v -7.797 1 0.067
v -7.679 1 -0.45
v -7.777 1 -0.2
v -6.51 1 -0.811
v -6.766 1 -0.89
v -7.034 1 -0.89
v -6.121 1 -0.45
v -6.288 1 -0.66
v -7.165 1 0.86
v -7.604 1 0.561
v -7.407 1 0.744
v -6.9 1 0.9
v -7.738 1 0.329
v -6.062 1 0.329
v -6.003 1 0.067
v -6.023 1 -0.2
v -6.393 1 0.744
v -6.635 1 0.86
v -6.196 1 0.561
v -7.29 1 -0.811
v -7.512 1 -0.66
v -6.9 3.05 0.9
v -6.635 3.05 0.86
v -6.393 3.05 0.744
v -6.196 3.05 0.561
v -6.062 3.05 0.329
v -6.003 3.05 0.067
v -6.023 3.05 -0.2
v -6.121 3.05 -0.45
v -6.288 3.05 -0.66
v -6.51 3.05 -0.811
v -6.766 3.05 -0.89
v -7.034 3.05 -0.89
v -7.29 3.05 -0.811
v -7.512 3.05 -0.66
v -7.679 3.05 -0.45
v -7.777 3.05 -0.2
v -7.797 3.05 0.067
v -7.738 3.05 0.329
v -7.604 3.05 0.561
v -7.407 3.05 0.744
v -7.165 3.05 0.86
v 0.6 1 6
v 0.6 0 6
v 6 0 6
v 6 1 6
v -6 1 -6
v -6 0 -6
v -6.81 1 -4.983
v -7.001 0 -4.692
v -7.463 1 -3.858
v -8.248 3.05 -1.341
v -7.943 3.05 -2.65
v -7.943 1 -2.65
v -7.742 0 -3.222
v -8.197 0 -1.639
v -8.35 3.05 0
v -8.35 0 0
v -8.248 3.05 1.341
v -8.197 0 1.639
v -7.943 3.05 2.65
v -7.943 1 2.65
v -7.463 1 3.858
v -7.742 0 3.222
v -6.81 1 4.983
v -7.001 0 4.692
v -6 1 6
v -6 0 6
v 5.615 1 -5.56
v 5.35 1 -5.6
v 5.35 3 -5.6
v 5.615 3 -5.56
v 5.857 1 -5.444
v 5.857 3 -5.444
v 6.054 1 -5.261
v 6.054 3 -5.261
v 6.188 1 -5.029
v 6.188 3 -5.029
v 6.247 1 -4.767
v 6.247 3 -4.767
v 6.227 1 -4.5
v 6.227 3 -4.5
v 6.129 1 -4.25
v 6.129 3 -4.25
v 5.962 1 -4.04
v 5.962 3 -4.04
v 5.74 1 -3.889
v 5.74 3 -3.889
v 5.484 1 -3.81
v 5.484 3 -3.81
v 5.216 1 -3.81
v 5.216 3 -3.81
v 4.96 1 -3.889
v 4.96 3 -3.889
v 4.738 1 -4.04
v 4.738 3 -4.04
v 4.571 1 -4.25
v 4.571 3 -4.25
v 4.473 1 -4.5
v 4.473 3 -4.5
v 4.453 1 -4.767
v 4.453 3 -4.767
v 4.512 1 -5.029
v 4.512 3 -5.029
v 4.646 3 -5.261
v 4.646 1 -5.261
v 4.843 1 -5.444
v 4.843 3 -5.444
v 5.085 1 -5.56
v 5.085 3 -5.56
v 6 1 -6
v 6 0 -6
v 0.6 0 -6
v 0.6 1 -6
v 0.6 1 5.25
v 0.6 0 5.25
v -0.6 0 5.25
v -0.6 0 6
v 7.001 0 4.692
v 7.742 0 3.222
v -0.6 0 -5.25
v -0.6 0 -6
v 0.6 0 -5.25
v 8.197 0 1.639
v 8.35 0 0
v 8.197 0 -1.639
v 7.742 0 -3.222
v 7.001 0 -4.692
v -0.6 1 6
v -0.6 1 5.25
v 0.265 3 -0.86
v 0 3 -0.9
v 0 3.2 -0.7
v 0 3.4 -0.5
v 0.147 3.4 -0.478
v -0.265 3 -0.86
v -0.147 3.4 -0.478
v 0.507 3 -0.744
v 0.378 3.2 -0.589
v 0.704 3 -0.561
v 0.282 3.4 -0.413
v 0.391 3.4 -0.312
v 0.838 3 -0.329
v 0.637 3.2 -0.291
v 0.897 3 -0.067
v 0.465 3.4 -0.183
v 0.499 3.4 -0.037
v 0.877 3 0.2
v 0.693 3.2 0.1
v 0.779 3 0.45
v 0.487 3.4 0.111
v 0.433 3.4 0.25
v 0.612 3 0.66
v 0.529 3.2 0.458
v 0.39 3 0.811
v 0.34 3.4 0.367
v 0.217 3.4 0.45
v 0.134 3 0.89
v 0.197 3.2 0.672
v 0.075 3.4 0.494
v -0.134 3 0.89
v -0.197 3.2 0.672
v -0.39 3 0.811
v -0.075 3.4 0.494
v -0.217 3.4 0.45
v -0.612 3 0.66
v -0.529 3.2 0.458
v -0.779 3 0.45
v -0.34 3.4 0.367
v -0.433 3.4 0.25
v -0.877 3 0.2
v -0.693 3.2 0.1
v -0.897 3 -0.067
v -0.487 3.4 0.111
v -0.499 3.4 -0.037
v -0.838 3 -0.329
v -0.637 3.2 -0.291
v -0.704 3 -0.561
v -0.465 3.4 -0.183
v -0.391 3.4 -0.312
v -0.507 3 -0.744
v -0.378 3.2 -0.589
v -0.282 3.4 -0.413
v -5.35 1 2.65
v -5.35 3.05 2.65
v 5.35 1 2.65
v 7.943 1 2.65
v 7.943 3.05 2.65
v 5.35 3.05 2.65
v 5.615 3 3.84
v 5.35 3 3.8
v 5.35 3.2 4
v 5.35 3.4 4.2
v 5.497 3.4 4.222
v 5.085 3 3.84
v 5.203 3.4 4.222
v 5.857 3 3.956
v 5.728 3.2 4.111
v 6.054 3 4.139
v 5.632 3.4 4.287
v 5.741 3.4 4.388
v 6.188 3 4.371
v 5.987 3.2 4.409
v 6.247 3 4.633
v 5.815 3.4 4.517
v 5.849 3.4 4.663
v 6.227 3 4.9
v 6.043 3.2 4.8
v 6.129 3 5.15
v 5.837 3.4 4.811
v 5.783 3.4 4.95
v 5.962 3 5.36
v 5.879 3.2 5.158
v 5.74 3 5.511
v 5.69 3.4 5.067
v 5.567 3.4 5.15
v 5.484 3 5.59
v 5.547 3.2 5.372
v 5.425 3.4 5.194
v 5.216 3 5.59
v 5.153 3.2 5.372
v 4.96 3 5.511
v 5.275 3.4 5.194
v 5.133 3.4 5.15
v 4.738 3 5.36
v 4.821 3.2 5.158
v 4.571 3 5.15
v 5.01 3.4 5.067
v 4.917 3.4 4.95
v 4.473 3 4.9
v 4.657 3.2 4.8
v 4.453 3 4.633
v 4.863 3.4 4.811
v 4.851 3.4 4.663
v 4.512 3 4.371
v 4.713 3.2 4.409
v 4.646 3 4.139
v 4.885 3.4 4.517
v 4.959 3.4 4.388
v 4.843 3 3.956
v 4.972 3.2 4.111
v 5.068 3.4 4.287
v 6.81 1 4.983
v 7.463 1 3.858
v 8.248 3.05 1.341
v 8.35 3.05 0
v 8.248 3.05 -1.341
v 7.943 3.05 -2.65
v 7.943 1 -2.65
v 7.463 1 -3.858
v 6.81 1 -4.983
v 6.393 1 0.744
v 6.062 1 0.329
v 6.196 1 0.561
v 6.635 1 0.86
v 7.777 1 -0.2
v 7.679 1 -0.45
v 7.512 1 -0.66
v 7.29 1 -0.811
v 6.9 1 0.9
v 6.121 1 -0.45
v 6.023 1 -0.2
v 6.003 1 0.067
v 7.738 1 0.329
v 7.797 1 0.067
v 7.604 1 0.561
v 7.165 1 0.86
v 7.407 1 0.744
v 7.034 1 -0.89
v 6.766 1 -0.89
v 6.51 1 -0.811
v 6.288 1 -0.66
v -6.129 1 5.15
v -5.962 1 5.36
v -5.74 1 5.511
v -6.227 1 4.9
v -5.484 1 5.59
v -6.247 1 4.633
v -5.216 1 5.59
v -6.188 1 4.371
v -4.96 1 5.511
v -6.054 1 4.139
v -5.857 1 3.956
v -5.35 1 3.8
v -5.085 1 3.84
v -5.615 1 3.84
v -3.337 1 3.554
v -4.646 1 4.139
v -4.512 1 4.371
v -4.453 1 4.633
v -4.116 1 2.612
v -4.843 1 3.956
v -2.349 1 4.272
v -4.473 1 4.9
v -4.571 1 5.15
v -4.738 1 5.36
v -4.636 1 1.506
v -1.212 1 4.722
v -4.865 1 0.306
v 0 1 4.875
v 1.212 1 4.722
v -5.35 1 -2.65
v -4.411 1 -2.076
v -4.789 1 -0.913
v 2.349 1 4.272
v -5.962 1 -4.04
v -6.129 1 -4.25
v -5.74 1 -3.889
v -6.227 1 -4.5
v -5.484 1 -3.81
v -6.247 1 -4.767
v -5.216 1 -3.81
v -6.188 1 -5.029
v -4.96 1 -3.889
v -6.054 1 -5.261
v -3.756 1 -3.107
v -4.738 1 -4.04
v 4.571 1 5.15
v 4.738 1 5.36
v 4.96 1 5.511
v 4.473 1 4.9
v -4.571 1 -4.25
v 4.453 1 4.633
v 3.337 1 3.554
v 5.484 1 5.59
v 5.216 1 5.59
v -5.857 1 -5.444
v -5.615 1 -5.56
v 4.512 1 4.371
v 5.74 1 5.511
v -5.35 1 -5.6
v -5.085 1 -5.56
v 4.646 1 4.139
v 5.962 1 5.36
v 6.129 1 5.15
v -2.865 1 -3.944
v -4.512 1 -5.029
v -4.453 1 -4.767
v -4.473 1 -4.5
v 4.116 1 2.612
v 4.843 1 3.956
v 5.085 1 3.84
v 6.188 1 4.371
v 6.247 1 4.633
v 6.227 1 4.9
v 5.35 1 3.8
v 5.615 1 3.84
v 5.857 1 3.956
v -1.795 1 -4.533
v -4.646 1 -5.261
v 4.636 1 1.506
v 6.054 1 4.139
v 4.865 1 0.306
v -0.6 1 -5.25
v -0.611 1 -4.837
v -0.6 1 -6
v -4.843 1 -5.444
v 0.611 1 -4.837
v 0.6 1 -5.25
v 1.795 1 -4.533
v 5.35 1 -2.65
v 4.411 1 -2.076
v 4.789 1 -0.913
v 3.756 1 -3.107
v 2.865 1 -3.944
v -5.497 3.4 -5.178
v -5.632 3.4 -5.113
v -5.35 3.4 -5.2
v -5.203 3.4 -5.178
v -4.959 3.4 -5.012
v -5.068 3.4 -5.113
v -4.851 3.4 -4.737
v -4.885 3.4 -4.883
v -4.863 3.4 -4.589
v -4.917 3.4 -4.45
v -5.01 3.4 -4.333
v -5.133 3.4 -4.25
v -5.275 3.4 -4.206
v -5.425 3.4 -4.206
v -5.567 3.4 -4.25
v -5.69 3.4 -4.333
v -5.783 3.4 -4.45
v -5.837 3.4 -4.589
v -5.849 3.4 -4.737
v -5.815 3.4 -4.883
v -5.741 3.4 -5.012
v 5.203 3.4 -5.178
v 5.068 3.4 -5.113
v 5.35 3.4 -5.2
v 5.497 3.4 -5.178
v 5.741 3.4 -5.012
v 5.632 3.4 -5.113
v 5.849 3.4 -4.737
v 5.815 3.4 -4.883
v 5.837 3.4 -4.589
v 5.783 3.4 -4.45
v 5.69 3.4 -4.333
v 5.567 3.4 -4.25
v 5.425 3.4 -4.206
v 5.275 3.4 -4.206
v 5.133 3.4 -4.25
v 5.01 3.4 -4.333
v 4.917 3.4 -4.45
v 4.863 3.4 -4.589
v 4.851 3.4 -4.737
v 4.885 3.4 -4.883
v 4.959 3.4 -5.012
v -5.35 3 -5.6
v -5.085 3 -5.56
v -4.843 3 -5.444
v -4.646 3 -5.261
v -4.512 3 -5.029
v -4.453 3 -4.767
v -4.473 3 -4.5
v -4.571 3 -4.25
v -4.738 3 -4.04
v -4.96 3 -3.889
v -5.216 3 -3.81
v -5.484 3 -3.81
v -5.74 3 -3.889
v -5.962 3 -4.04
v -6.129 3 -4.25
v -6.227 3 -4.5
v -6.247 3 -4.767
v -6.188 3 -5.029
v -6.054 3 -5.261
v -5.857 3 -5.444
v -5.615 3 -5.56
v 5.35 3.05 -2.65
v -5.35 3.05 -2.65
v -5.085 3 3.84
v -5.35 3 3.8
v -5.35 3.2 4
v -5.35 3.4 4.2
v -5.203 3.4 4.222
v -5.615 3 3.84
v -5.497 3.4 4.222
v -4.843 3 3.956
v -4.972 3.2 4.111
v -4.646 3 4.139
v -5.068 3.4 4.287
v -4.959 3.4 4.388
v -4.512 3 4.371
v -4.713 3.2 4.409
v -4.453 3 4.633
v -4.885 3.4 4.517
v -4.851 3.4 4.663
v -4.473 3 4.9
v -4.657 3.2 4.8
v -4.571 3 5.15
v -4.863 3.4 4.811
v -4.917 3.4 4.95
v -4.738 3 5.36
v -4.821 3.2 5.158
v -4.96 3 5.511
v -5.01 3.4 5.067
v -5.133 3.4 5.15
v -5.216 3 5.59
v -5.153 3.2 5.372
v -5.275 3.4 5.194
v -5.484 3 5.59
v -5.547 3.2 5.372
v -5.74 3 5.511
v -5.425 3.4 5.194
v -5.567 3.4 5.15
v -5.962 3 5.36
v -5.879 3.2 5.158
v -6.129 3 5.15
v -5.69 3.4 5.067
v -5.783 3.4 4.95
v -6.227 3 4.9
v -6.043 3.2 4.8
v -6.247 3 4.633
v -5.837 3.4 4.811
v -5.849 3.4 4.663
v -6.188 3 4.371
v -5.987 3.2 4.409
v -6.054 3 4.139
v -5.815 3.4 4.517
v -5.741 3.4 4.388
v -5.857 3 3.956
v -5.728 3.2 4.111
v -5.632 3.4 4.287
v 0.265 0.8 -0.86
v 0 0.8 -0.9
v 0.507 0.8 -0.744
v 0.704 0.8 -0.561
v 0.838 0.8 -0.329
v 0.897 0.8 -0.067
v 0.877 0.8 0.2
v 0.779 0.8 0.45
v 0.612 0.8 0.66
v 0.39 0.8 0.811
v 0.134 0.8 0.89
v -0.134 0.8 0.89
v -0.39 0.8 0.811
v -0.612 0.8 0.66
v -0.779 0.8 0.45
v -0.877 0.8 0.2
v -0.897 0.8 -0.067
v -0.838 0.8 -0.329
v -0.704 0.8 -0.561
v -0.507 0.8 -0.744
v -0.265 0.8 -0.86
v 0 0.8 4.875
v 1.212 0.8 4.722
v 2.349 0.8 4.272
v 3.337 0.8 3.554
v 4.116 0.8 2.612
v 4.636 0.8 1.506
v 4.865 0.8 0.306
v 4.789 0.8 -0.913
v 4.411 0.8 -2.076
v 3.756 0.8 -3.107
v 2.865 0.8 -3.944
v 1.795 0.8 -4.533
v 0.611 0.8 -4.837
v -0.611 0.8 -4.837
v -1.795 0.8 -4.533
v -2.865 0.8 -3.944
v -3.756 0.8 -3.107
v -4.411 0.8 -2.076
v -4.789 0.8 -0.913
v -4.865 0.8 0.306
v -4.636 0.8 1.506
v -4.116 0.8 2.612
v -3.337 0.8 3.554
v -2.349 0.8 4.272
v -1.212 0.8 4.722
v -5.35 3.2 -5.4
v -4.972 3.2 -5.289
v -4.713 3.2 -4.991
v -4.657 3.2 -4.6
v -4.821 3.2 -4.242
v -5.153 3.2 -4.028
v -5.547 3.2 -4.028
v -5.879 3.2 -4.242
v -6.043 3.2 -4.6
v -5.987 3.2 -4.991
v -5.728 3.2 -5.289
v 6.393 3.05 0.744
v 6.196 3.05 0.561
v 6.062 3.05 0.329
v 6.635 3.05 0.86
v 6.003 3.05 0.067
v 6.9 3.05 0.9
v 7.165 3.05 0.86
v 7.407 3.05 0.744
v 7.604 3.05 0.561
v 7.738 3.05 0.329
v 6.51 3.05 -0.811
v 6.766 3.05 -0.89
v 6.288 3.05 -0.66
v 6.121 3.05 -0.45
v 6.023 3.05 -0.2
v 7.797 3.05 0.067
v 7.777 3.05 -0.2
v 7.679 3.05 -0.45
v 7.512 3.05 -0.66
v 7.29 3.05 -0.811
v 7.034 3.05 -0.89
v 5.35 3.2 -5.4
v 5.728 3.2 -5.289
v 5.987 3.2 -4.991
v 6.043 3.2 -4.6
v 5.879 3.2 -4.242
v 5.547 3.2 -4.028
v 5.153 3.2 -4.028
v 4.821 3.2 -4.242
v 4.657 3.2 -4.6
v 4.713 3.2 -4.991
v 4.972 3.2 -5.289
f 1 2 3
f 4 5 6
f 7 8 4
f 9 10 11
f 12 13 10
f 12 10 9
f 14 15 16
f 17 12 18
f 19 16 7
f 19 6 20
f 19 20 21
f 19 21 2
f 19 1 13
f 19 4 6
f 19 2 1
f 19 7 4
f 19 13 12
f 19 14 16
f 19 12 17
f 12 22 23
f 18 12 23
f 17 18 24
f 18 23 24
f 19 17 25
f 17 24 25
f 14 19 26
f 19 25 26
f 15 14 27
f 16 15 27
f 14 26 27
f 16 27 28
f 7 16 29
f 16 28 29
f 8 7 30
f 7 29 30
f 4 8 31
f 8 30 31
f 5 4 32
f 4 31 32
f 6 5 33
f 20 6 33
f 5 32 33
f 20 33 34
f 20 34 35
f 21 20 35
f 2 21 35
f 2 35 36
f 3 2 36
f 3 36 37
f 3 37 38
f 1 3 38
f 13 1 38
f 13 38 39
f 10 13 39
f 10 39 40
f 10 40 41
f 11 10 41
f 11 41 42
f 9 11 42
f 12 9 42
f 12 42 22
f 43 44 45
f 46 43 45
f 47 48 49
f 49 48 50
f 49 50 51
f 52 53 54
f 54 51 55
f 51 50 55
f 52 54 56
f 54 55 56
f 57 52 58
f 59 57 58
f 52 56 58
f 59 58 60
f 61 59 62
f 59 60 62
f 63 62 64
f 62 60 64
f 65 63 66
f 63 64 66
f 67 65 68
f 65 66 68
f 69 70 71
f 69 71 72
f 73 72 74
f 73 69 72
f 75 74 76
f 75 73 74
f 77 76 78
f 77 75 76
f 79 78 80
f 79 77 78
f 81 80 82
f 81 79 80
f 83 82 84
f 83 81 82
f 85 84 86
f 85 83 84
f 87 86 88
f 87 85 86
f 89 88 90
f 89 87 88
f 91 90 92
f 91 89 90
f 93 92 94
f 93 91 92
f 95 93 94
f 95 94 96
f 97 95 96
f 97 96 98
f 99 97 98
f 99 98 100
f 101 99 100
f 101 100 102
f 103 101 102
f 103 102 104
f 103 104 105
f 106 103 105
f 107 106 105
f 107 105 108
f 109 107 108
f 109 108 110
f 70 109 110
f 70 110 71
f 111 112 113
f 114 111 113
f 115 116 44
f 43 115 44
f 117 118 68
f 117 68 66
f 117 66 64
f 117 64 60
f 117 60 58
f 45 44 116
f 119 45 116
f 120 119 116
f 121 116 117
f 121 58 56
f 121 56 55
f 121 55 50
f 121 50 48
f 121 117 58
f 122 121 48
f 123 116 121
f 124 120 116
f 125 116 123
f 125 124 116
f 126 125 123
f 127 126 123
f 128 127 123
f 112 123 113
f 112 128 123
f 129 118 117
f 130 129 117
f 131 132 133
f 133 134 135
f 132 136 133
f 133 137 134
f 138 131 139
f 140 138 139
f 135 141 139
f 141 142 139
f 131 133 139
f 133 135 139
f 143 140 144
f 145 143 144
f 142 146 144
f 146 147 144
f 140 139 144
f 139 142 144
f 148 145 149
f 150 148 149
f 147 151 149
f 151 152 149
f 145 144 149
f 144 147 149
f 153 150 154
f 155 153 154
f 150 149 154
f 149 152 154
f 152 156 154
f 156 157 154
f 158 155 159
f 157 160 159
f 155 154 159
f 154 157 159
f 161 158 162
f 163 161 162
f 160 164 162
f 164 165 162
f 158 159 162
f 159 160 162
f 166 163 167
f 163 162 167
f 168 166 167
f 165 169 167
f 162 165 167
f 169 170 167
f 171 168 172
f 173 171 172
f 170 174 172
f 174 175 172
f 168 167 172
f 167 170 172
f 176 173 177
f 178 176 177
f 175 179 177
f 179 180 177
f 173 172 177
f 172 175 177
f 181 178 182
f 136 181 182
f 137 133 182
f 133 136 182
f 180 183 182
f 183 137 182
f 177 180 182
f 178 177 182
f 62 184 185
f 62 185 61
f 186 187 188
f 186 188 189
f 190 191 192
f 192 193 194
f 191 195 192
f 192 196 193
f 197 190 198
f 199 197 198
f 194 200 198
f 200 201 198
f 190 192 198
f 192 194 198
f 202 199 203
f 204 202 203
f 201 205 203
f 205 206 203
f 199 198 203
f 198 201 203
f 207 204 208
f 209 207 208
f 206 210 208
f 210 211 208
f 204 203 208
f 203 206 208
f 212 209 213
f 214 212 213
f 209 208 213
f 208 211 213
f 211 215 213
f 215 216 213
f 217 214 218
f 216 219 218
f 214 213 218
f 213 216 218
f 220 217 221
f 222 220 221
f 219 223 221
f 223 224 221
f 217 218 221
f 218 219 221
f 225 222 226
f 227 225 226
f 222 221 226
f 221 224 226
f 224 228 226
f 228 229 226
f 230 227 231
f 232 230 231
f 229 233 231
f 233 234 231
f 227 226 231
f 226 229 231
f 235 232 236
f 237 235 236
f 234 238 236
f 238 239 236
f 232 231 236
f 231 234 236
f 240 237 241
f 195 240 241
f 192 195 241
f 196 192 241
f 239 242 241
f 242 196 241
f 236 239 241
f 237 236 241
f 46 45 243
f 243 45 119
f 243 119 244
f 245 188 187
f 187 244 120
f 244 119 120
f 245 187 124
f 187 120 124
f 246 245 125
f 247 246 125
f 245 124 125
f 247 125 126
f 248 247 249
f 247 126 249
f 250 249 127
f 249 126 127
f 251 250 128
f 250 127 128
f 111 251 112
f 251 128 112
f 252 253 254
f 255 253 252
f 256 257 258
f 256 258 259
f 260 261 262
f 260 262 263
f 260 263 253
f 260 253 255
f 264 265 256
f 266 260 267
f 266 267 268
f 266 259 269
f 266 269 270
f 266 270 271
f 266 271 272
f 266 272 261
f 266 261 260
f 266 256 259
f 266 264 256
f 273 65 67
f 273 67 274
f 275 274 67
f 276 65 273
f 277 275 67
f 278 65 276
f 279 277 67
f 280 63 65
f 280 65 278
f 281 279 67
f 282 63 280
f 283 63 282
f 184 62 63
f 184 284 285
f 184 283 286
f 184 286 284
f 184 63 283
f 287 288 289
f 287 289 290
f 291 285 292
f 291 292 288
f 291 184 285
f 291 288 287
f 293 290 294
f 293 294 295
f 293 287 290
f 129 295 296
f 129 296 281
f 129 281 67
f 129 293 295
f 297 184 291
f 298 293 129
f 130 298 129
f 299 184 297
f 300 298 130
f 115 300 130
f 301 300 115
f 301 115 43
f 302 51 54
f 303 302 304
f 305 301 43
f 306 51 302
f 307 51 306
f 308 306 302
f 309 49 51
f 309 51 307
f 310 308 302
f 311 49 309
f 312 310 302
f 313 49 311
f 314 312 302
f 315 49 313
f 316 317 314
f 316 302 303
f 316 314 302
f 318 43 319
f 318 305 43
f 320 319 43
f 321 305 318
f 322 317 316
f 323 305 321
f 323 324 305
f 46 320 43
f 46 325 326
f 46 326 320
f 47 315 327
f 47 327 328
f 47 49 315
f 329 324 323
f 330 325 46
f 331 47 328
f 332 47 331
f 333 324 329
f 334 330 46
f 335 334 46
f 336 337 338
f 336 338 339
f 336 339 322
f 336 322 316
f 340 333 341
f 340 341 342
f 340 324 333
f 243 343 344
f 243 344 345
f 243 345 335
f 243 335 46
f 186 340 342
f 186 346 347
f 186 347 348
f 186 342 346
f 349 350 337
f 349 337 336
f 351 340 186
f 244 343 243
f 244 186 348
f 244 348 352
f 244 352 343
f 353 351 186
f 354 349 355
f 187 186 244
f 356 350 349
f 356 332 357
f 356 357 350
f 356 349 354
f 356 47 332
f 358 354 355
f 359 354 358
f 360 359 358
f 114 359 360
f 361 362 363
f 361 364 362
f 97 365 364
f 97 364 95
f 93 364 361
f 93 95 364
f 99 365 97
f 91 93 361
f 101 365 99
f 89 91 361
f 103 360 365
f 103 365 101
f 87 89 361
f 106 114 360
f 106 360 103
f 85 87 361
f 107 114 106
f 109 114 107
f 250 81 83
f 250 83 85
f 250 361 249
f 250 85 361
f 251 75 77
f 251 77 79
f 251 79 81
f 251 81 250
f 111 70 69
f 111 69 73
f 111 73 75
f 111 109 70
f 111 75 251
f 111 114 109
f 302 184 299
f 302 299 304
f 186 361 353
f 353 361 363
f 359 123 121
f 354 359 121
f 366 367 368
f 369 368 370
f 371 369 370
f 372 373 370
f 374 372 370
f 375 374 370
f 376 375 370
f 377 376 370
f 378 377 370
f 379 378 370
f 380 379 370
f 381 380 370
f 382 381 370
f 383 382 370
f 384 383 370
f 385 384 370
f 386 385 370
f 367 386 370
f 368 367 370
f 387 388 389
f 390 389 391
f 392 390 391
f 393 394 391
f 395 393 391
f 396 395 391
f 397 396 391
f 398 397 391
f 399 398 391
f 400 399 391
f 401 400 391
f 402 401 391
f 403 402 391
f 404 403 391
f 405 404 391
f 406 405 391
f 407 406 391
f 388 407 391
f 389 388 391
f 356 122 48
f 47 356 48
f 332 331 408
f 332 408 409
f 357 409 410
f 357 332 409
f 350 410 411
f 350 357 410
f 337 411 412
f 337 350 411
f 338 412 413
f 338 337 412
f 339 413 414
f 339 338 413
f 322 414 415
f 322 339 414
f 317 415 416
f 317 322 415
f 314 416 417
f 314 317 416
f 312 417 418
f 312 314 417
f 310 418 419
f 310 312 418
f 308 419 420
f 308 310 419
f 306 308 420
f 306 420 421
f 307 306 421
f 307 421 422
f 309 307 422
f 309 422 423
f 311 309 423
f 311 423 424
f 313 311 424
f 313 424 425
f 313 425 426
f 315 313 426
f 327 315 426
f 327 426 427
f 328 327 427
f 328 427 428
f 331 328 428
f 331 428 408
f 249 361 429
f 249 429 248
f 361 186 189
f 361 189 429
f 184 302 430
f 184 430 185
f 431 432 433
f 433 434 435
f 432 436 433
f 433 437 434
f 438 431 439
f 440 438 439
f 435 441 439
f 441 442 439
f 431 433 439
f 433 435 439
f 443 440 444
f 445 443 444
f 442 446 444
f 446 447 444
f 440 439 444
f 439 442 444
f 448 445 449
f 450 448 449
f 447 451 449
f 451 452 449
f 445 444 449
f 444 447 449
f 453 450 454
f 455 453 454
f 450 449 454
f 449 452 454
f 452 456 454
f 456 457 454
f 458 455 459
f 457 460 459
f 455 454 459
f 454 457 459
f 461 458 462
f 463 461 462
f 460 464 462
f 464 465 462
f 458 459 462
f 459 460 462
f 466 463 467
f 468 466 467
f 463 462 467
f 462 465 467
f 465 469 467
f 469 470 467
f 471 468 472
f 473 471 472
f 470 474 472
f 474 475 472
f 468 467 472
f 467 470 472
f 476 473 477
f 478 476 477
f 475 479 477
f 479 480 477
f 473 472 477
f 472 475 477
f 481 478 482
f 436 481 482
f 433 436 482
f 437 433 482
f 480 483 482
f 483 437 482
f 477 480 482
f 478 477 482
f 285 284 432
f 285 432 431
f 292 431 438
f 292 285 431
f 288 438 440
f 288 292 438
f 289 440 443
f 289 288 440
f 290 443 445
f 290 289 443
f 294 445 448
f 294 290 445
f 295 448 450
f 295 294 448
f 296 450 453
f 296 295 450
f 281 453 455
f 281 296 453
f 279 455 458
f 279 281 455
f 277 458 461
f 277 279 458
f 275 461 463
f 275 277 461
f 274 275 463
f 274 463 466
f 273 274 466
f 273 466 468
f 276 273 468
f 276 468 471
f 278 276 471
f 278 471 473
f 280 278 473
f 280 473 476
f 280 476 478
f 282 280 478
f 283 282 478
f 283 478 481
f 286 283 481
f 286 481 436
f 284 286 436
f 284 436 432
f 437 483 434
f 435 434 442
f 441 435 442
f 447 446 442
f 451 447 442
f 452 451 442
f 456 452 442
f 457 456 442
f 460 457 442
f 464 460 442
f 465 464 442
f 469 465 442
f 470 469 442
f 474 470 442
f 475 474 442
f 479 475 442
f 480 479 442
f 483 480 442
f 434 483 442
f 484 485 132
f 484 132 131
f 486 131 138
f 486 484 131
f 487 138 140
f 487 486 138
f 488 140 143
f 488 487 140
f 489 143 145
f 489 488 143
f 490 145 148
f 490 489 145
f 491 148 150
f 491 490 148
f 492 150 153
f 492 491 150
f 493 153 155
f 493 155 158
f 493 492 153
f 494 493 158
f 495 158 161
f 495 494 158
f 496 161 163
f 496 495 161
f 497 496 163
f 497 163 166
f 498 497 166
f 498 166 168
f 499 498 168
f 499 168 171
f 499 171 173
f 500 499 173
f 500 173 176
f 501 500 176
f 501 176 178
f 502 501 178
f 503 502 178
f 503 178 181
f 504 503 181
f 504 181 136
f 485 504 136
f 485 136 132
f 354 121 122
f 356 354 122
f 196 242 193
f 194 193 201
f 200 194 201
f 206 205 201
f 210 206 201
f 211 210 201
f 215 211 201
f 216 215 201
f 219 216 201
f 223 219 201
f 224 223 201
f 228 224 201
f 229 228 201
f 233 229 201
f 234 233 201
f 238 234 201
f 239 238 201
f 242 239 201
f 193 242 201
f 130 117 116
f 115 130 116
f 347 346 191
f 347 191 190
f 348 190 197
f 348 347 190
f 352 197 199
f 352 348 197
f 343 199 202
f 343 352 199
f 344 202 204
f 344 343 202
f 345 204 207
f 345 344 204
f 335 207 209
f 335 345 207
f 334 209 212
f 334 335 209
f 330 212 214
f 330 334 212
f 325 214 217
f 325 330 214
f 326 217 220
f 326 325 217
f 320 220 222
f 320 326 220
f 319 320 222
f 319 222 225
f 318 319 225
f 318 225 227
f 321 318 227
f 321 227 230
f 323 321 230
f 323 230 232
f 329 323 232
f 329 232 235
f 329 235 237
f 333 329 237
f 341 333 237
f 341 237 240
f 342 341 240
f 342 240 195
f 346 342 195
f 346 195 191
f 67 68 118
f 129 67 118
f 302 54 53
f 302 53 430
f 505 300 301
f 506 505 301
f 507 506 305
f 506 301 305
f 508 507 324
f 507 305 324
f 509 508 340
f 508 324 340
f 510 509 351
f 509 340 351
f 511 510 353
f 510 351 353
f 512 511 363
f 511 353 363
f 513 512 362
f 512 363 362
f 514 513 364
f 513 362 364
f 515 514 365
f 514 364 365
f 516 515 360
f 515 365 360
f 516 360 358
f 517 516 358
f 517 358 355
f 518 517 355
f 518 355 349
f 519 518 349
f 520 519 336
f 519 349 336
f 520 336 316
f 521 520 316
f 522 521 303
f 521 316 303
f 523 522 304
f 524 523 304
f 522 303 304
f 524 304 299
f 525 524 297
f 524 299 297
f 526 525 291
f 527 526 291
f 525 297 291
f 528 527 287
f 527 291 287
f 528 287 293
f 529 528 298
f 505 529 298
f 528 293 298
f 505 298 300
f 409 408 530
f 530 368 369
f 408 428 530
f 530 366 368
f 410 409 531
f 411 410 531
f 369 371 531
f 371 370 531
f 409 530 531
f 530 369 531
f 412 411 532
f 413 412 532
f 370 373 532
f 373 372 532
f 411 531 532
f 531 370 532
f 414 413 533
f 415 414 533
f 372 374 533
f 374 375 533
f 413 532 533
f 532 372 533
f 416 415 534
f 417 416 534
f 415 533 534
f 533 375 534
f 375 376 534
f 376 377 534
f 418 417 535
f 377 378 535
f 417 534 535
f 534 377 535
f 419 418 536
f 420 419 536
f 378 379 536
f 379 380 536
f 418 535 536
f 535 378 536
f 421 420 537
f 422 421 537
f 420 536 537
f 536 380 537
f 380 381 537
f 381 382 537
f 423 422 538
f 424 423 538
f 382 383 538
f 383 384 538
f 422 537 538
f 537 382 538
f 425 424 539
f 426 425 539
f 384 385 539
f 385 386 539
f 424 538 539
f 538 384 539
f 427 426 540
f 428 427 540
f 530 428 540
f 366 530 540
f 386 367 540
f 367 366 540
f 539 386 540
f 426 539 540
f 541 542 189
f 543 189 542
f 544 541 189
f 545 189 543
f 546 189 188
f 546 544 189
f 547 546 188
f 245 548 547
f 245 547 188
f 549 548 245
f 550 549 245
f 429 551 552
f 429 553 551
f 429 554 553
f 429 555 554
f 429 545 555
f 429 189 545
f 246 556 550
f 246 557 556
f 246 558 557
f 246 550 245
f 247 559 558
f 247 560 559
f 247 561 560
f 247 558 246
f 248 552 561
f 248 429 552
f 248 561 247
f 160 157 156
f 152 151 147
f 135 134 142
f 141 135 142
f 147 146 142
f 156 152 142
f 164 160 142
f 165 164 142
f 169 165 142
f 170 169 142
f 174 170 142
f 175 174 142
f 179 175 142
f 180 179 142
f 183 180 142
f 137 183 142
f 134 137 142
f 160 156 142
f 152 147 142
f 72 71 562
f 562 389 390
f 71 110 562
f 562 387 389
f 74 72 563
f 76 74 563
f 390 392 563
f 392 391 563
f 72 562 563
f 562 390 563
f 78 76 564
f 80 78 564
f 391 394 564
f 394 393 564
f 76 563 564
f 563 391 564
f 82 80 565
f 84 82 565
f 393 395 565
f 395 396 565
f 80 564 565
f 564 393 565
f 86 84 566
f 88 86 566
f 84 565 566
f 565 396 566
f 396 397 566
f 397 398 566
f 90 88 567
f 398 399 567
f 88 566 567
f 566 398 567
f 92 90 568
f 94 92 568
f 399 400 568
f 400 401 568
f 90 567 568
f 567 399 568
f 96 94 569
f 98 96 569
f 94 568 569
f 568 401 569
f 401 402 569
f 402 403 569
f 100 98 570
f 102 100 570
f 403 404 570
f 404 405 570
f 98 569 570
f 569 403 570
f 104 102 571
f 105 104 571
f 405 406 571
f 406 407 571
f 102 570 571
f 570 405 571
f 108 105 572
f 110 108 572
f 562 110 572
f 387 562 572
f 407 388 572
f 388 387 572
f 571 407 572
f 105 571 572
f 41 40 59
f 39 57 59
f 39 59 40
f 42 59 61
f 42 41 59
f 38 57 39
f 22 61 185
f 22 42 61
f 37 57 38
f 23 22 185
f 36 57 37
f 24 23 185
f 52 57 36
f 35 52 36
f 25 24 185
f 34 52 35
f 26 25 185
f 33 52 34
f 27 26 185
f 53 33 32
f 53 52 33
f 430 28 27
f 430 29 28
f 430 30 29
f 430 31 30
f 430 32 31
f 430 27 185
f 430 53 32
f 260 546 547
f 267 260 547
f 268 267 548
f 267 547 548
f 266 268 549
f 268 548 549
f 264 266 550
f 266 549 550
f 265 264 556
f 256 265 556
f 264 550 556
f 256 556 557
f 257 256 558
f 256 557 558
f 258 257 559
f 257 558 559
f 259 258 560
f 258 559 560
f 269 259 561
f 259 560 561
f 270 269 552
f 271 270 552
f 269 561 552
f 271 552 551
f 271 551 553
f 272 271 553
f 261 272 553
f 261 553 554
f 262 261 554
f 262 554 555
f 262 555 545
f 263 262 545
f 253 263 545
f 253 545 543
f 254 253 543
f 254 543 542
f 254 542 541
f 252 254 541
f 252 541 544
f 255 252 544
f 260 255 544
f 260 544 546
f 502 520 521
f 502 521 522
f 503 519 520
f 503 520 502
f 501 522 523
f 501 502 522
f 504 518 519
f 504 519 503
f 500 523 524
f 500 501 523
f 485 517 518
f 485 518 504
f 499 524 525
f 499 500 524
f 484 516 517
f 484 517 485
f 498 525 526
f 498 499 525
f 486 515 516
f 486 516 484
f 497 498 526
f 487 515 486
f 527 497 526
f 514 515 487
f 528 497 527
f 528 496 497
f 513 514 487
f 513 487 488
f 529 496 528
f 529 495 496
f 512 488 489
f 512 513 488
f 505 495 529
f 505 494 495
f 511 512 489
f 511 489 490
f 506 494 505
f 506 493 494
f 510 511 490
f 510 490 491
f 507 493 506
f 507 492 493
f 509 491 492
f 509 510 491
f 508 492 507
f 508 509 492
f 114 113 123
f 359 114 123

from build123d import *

# Parameters (mm, degrees)
SALIENTE_EXTRUIR1_DEPTH = 1
CROQUIS3_R              = 4.875
CORTAR_EXTRUIR1_DEPTH   = 0.2
CROQUIS4_R              = 0.9
CROQUIS4_R_2            = 0.8999999999999994
SALIENTE_EXTRUIR2_DEPTH = 3.4
CHAFL_N1_SIZE           = 0.4
CROQUIS5_R              = 0.8999999999999995
CROQUIS5_R_2            = 0.9000000000000004
CORTAR_EXTRUIR2_DEPTH   = 2.4
CORTAR_EXTRUIR3_START   = -0.35
CORTAR_EXTRUIR3_DEPTH   = 0.35


with BuildPart() as part:
    # Croquis1 → Saliente-Extruir1 (new body)
    with BuildSketch(Plane(origin=(0, 0, 0), x_dir=(1, 0, 0), z_dir=(0, 1, 0))):
        with BuildLine():
            Line((6.000000000184592, 6.000000000000001), (0.6000000001845911, 6.0000000000897735))
            Line((0.6000000001845911, 6.0000000000897735), (0.600000000184591, 5.250000000089774))
            Line((0.600000000184591, 5.250000000089774), (-0.5999999998154079, 5.250000000089775))
            Line((-0.5999999998154079, 5.250000000089775), (-0.5999999998154087, 6.000000000109725))
            Line((-0.5999999998154087, 6.000000000109725), (-5.999999999815408, 6.0000000001995))
            ThreePointArc((-5.999999999815408, 6.0000000001995), (-8.349999999490638, 1.358977e-10), (-6, -6.000000000000001))
            Line((-6, -6.000000000000001), (-0.6, -6.000000000089775))
            Line((-0.6, -6.000000000089775), (-0.6, -5.250000000109726))
            Line((-0.6, -5.250000000109726), (0.6, -5.250000000109726))
            Line((0.6, -5.250000000109726), (0.6000000000000001, -6.000000000109724))
            Line((0.6000000000000001, -6.000000000109724), (6.000000000000001, -6.000000000199499))
            ThreePointArc((6.000000000000001, -6.000000000199499), (8.349999999490638, -1.3589858e-10), (6.000000000184592, 6.000000000000001))
        make_face()
    extrude(amount=SALIENTE_EXTRUIR1_DEPTH)

    # Croquis3 → Cortar-Extruir1 (cut)
    with BuildSketch(Plane(origin=(0, 1, 0), x_dir=(1, 0, 0), z_dir=(0, 1, 0))):
        with Locations(Location((0, 0, 0), (0, 0, 270))):
            Circle(CROQUIS3_R)
    extrude(amount=-CORTAR_EXTRUIR1_DEPTH, mode=Mode.SUBTRACT)

    # Croquis4 → Saliente-Extruir2 (add)
    with BuildSketch(Plane.XZ):
        with Locations(Location((0, 0, 0), (0, 0, 270))):
            Circle(CROQUIS4_R)
        with Locations(Location((-5.3500000000000005, 4.700000000000001, 0), (0, 0, 270))):
            Circle(CROQUIS4_R_2)
        with Locations(Location((-5.349999999815407, -4.700000000199502, 0), (0, 0, 270))):
            Circle(CROQUIS4_R_2)
        with Locations(Location((5.3500000000000005, 4.700000000000001, 0), (0, 0, 270))):
            Circle(CROQUIS4_R_2)
        with Locations(Location((5.3500000000000005, -4.700000000199502, 0), (0, 0, 270))):
            Circle(CROQUIS4_R_2)
        with BuildLine():
            Line((5.3500000000000005, 2.65), (5.3500000000000005, -2.65))
            Line((5.3500000000000005, -2.65), (7.9431895310497564, -2.65))
            ThreePointArc((7.9431895310497564, -2.65), (8.349999999490638, 0), (7.9431895310497564, 2.65))
            Line((7.9431895310497564, 2.65), (5.3500000000000005, 2.65))
        make_face()
        with BuildLine():
            Line((-5.349999999999999, -2.65), (-5.349999999999999, 2.65))
            Line((-5.349999999999999, 2.65), (-7.94318953102517, 2.65))
            ThreePointArc((-7.94318953102517, 2.65), (-8.349999999490638, 1.08e-15), (-7.94318953102517, -2.65))
            Line((-7.94318953102517, -2.65), (-5.349999999999999, -2.65))
        make_face()
    extrude(amount=-SALIENTE_EXTRUIR2_DEPTH)

    # Chaflán1
    chafl_n1_edges = [part.edges().sort_by_distance(p)[0] for p in [
        (2.8e-16, 3.4, 0.9),
        (-5.3500000000000005, 3.4, 5.6000000000000005),
        (5.3500000000000005, 3.4, 5.6000000000000005),
        (-5.349999999815407, 3.4, -3.8000000001995025),
        (5.3500000000000005, 3.4, -3.8000000001995025),
    ]]
    chamfer(chafl_n1_edges, length=CHAFL_N1_SIZE)

    # Croquis5 → Cortar-Extruir2 (cut)
    with BuildSketch(Plane(origin=(0, 3.4, 0), x_dir=(1, 0, 0), z_dir=(0, 1, 0))):
        with Locations(Location((-6.899999999999999, 0, 0), (0, 0, 270))):
            Circle(CROQUIS5_R)
        with Locations(Location((6.8999999999999995, 0, 0), (0, 0, 270))):
            Circle(CROQUIS5_R_2)
    extrude(amount=-CORTAR_EXTRUIR2_DEPTH, mode=Mode.SUBTRACT)

    # Croquis6 → Cortar-Extruir3 (cut)
    with BuildSketch(Plane(origin=(0, 3.4, 0), x_dir=(1, 0, 0), z_dir=(0, 1, 0)).offset(CORTAR_EXTRUIR3_START)):
        with BuildLine():
            Line((-5.349999999999999, 2.65), (-7.943189531025168, 2.6499999999999995))
            ThreePointArc((-7.943189531025168, 2.6499999999999995), (-8.349999999490636, 1.08e-15), (-7.94318953102517, -2.65))
            Line((-7.94318953102517, -2.65), (-5.349999999999999, -2.65))
            Line((-5.349999999999999, -2.65), (-5.349999999999999, 2.65))
        make_face()
        with BuildLine():
            Line((5.3500000000000005, -2.65), (7.9431895310497564, -2.6499999999999995))
            ThreePointArc((7.9431895310497564, -2.6499999999999995), (8.349999999490638, 4.9e-16), (7.9431895310497564, 2.65))
            Line((7.9431895310497564, 2.65), (5.3500000000000005, 2.65))
            Line((5.3500000000000005, 2.65), (5.3500000000000005, -2.65))
        make_face()
    extrude(amount=CORTAR_EXTRUIR3_DEPTH, mode=Mode.SUBTRACT)


solid = part.part
